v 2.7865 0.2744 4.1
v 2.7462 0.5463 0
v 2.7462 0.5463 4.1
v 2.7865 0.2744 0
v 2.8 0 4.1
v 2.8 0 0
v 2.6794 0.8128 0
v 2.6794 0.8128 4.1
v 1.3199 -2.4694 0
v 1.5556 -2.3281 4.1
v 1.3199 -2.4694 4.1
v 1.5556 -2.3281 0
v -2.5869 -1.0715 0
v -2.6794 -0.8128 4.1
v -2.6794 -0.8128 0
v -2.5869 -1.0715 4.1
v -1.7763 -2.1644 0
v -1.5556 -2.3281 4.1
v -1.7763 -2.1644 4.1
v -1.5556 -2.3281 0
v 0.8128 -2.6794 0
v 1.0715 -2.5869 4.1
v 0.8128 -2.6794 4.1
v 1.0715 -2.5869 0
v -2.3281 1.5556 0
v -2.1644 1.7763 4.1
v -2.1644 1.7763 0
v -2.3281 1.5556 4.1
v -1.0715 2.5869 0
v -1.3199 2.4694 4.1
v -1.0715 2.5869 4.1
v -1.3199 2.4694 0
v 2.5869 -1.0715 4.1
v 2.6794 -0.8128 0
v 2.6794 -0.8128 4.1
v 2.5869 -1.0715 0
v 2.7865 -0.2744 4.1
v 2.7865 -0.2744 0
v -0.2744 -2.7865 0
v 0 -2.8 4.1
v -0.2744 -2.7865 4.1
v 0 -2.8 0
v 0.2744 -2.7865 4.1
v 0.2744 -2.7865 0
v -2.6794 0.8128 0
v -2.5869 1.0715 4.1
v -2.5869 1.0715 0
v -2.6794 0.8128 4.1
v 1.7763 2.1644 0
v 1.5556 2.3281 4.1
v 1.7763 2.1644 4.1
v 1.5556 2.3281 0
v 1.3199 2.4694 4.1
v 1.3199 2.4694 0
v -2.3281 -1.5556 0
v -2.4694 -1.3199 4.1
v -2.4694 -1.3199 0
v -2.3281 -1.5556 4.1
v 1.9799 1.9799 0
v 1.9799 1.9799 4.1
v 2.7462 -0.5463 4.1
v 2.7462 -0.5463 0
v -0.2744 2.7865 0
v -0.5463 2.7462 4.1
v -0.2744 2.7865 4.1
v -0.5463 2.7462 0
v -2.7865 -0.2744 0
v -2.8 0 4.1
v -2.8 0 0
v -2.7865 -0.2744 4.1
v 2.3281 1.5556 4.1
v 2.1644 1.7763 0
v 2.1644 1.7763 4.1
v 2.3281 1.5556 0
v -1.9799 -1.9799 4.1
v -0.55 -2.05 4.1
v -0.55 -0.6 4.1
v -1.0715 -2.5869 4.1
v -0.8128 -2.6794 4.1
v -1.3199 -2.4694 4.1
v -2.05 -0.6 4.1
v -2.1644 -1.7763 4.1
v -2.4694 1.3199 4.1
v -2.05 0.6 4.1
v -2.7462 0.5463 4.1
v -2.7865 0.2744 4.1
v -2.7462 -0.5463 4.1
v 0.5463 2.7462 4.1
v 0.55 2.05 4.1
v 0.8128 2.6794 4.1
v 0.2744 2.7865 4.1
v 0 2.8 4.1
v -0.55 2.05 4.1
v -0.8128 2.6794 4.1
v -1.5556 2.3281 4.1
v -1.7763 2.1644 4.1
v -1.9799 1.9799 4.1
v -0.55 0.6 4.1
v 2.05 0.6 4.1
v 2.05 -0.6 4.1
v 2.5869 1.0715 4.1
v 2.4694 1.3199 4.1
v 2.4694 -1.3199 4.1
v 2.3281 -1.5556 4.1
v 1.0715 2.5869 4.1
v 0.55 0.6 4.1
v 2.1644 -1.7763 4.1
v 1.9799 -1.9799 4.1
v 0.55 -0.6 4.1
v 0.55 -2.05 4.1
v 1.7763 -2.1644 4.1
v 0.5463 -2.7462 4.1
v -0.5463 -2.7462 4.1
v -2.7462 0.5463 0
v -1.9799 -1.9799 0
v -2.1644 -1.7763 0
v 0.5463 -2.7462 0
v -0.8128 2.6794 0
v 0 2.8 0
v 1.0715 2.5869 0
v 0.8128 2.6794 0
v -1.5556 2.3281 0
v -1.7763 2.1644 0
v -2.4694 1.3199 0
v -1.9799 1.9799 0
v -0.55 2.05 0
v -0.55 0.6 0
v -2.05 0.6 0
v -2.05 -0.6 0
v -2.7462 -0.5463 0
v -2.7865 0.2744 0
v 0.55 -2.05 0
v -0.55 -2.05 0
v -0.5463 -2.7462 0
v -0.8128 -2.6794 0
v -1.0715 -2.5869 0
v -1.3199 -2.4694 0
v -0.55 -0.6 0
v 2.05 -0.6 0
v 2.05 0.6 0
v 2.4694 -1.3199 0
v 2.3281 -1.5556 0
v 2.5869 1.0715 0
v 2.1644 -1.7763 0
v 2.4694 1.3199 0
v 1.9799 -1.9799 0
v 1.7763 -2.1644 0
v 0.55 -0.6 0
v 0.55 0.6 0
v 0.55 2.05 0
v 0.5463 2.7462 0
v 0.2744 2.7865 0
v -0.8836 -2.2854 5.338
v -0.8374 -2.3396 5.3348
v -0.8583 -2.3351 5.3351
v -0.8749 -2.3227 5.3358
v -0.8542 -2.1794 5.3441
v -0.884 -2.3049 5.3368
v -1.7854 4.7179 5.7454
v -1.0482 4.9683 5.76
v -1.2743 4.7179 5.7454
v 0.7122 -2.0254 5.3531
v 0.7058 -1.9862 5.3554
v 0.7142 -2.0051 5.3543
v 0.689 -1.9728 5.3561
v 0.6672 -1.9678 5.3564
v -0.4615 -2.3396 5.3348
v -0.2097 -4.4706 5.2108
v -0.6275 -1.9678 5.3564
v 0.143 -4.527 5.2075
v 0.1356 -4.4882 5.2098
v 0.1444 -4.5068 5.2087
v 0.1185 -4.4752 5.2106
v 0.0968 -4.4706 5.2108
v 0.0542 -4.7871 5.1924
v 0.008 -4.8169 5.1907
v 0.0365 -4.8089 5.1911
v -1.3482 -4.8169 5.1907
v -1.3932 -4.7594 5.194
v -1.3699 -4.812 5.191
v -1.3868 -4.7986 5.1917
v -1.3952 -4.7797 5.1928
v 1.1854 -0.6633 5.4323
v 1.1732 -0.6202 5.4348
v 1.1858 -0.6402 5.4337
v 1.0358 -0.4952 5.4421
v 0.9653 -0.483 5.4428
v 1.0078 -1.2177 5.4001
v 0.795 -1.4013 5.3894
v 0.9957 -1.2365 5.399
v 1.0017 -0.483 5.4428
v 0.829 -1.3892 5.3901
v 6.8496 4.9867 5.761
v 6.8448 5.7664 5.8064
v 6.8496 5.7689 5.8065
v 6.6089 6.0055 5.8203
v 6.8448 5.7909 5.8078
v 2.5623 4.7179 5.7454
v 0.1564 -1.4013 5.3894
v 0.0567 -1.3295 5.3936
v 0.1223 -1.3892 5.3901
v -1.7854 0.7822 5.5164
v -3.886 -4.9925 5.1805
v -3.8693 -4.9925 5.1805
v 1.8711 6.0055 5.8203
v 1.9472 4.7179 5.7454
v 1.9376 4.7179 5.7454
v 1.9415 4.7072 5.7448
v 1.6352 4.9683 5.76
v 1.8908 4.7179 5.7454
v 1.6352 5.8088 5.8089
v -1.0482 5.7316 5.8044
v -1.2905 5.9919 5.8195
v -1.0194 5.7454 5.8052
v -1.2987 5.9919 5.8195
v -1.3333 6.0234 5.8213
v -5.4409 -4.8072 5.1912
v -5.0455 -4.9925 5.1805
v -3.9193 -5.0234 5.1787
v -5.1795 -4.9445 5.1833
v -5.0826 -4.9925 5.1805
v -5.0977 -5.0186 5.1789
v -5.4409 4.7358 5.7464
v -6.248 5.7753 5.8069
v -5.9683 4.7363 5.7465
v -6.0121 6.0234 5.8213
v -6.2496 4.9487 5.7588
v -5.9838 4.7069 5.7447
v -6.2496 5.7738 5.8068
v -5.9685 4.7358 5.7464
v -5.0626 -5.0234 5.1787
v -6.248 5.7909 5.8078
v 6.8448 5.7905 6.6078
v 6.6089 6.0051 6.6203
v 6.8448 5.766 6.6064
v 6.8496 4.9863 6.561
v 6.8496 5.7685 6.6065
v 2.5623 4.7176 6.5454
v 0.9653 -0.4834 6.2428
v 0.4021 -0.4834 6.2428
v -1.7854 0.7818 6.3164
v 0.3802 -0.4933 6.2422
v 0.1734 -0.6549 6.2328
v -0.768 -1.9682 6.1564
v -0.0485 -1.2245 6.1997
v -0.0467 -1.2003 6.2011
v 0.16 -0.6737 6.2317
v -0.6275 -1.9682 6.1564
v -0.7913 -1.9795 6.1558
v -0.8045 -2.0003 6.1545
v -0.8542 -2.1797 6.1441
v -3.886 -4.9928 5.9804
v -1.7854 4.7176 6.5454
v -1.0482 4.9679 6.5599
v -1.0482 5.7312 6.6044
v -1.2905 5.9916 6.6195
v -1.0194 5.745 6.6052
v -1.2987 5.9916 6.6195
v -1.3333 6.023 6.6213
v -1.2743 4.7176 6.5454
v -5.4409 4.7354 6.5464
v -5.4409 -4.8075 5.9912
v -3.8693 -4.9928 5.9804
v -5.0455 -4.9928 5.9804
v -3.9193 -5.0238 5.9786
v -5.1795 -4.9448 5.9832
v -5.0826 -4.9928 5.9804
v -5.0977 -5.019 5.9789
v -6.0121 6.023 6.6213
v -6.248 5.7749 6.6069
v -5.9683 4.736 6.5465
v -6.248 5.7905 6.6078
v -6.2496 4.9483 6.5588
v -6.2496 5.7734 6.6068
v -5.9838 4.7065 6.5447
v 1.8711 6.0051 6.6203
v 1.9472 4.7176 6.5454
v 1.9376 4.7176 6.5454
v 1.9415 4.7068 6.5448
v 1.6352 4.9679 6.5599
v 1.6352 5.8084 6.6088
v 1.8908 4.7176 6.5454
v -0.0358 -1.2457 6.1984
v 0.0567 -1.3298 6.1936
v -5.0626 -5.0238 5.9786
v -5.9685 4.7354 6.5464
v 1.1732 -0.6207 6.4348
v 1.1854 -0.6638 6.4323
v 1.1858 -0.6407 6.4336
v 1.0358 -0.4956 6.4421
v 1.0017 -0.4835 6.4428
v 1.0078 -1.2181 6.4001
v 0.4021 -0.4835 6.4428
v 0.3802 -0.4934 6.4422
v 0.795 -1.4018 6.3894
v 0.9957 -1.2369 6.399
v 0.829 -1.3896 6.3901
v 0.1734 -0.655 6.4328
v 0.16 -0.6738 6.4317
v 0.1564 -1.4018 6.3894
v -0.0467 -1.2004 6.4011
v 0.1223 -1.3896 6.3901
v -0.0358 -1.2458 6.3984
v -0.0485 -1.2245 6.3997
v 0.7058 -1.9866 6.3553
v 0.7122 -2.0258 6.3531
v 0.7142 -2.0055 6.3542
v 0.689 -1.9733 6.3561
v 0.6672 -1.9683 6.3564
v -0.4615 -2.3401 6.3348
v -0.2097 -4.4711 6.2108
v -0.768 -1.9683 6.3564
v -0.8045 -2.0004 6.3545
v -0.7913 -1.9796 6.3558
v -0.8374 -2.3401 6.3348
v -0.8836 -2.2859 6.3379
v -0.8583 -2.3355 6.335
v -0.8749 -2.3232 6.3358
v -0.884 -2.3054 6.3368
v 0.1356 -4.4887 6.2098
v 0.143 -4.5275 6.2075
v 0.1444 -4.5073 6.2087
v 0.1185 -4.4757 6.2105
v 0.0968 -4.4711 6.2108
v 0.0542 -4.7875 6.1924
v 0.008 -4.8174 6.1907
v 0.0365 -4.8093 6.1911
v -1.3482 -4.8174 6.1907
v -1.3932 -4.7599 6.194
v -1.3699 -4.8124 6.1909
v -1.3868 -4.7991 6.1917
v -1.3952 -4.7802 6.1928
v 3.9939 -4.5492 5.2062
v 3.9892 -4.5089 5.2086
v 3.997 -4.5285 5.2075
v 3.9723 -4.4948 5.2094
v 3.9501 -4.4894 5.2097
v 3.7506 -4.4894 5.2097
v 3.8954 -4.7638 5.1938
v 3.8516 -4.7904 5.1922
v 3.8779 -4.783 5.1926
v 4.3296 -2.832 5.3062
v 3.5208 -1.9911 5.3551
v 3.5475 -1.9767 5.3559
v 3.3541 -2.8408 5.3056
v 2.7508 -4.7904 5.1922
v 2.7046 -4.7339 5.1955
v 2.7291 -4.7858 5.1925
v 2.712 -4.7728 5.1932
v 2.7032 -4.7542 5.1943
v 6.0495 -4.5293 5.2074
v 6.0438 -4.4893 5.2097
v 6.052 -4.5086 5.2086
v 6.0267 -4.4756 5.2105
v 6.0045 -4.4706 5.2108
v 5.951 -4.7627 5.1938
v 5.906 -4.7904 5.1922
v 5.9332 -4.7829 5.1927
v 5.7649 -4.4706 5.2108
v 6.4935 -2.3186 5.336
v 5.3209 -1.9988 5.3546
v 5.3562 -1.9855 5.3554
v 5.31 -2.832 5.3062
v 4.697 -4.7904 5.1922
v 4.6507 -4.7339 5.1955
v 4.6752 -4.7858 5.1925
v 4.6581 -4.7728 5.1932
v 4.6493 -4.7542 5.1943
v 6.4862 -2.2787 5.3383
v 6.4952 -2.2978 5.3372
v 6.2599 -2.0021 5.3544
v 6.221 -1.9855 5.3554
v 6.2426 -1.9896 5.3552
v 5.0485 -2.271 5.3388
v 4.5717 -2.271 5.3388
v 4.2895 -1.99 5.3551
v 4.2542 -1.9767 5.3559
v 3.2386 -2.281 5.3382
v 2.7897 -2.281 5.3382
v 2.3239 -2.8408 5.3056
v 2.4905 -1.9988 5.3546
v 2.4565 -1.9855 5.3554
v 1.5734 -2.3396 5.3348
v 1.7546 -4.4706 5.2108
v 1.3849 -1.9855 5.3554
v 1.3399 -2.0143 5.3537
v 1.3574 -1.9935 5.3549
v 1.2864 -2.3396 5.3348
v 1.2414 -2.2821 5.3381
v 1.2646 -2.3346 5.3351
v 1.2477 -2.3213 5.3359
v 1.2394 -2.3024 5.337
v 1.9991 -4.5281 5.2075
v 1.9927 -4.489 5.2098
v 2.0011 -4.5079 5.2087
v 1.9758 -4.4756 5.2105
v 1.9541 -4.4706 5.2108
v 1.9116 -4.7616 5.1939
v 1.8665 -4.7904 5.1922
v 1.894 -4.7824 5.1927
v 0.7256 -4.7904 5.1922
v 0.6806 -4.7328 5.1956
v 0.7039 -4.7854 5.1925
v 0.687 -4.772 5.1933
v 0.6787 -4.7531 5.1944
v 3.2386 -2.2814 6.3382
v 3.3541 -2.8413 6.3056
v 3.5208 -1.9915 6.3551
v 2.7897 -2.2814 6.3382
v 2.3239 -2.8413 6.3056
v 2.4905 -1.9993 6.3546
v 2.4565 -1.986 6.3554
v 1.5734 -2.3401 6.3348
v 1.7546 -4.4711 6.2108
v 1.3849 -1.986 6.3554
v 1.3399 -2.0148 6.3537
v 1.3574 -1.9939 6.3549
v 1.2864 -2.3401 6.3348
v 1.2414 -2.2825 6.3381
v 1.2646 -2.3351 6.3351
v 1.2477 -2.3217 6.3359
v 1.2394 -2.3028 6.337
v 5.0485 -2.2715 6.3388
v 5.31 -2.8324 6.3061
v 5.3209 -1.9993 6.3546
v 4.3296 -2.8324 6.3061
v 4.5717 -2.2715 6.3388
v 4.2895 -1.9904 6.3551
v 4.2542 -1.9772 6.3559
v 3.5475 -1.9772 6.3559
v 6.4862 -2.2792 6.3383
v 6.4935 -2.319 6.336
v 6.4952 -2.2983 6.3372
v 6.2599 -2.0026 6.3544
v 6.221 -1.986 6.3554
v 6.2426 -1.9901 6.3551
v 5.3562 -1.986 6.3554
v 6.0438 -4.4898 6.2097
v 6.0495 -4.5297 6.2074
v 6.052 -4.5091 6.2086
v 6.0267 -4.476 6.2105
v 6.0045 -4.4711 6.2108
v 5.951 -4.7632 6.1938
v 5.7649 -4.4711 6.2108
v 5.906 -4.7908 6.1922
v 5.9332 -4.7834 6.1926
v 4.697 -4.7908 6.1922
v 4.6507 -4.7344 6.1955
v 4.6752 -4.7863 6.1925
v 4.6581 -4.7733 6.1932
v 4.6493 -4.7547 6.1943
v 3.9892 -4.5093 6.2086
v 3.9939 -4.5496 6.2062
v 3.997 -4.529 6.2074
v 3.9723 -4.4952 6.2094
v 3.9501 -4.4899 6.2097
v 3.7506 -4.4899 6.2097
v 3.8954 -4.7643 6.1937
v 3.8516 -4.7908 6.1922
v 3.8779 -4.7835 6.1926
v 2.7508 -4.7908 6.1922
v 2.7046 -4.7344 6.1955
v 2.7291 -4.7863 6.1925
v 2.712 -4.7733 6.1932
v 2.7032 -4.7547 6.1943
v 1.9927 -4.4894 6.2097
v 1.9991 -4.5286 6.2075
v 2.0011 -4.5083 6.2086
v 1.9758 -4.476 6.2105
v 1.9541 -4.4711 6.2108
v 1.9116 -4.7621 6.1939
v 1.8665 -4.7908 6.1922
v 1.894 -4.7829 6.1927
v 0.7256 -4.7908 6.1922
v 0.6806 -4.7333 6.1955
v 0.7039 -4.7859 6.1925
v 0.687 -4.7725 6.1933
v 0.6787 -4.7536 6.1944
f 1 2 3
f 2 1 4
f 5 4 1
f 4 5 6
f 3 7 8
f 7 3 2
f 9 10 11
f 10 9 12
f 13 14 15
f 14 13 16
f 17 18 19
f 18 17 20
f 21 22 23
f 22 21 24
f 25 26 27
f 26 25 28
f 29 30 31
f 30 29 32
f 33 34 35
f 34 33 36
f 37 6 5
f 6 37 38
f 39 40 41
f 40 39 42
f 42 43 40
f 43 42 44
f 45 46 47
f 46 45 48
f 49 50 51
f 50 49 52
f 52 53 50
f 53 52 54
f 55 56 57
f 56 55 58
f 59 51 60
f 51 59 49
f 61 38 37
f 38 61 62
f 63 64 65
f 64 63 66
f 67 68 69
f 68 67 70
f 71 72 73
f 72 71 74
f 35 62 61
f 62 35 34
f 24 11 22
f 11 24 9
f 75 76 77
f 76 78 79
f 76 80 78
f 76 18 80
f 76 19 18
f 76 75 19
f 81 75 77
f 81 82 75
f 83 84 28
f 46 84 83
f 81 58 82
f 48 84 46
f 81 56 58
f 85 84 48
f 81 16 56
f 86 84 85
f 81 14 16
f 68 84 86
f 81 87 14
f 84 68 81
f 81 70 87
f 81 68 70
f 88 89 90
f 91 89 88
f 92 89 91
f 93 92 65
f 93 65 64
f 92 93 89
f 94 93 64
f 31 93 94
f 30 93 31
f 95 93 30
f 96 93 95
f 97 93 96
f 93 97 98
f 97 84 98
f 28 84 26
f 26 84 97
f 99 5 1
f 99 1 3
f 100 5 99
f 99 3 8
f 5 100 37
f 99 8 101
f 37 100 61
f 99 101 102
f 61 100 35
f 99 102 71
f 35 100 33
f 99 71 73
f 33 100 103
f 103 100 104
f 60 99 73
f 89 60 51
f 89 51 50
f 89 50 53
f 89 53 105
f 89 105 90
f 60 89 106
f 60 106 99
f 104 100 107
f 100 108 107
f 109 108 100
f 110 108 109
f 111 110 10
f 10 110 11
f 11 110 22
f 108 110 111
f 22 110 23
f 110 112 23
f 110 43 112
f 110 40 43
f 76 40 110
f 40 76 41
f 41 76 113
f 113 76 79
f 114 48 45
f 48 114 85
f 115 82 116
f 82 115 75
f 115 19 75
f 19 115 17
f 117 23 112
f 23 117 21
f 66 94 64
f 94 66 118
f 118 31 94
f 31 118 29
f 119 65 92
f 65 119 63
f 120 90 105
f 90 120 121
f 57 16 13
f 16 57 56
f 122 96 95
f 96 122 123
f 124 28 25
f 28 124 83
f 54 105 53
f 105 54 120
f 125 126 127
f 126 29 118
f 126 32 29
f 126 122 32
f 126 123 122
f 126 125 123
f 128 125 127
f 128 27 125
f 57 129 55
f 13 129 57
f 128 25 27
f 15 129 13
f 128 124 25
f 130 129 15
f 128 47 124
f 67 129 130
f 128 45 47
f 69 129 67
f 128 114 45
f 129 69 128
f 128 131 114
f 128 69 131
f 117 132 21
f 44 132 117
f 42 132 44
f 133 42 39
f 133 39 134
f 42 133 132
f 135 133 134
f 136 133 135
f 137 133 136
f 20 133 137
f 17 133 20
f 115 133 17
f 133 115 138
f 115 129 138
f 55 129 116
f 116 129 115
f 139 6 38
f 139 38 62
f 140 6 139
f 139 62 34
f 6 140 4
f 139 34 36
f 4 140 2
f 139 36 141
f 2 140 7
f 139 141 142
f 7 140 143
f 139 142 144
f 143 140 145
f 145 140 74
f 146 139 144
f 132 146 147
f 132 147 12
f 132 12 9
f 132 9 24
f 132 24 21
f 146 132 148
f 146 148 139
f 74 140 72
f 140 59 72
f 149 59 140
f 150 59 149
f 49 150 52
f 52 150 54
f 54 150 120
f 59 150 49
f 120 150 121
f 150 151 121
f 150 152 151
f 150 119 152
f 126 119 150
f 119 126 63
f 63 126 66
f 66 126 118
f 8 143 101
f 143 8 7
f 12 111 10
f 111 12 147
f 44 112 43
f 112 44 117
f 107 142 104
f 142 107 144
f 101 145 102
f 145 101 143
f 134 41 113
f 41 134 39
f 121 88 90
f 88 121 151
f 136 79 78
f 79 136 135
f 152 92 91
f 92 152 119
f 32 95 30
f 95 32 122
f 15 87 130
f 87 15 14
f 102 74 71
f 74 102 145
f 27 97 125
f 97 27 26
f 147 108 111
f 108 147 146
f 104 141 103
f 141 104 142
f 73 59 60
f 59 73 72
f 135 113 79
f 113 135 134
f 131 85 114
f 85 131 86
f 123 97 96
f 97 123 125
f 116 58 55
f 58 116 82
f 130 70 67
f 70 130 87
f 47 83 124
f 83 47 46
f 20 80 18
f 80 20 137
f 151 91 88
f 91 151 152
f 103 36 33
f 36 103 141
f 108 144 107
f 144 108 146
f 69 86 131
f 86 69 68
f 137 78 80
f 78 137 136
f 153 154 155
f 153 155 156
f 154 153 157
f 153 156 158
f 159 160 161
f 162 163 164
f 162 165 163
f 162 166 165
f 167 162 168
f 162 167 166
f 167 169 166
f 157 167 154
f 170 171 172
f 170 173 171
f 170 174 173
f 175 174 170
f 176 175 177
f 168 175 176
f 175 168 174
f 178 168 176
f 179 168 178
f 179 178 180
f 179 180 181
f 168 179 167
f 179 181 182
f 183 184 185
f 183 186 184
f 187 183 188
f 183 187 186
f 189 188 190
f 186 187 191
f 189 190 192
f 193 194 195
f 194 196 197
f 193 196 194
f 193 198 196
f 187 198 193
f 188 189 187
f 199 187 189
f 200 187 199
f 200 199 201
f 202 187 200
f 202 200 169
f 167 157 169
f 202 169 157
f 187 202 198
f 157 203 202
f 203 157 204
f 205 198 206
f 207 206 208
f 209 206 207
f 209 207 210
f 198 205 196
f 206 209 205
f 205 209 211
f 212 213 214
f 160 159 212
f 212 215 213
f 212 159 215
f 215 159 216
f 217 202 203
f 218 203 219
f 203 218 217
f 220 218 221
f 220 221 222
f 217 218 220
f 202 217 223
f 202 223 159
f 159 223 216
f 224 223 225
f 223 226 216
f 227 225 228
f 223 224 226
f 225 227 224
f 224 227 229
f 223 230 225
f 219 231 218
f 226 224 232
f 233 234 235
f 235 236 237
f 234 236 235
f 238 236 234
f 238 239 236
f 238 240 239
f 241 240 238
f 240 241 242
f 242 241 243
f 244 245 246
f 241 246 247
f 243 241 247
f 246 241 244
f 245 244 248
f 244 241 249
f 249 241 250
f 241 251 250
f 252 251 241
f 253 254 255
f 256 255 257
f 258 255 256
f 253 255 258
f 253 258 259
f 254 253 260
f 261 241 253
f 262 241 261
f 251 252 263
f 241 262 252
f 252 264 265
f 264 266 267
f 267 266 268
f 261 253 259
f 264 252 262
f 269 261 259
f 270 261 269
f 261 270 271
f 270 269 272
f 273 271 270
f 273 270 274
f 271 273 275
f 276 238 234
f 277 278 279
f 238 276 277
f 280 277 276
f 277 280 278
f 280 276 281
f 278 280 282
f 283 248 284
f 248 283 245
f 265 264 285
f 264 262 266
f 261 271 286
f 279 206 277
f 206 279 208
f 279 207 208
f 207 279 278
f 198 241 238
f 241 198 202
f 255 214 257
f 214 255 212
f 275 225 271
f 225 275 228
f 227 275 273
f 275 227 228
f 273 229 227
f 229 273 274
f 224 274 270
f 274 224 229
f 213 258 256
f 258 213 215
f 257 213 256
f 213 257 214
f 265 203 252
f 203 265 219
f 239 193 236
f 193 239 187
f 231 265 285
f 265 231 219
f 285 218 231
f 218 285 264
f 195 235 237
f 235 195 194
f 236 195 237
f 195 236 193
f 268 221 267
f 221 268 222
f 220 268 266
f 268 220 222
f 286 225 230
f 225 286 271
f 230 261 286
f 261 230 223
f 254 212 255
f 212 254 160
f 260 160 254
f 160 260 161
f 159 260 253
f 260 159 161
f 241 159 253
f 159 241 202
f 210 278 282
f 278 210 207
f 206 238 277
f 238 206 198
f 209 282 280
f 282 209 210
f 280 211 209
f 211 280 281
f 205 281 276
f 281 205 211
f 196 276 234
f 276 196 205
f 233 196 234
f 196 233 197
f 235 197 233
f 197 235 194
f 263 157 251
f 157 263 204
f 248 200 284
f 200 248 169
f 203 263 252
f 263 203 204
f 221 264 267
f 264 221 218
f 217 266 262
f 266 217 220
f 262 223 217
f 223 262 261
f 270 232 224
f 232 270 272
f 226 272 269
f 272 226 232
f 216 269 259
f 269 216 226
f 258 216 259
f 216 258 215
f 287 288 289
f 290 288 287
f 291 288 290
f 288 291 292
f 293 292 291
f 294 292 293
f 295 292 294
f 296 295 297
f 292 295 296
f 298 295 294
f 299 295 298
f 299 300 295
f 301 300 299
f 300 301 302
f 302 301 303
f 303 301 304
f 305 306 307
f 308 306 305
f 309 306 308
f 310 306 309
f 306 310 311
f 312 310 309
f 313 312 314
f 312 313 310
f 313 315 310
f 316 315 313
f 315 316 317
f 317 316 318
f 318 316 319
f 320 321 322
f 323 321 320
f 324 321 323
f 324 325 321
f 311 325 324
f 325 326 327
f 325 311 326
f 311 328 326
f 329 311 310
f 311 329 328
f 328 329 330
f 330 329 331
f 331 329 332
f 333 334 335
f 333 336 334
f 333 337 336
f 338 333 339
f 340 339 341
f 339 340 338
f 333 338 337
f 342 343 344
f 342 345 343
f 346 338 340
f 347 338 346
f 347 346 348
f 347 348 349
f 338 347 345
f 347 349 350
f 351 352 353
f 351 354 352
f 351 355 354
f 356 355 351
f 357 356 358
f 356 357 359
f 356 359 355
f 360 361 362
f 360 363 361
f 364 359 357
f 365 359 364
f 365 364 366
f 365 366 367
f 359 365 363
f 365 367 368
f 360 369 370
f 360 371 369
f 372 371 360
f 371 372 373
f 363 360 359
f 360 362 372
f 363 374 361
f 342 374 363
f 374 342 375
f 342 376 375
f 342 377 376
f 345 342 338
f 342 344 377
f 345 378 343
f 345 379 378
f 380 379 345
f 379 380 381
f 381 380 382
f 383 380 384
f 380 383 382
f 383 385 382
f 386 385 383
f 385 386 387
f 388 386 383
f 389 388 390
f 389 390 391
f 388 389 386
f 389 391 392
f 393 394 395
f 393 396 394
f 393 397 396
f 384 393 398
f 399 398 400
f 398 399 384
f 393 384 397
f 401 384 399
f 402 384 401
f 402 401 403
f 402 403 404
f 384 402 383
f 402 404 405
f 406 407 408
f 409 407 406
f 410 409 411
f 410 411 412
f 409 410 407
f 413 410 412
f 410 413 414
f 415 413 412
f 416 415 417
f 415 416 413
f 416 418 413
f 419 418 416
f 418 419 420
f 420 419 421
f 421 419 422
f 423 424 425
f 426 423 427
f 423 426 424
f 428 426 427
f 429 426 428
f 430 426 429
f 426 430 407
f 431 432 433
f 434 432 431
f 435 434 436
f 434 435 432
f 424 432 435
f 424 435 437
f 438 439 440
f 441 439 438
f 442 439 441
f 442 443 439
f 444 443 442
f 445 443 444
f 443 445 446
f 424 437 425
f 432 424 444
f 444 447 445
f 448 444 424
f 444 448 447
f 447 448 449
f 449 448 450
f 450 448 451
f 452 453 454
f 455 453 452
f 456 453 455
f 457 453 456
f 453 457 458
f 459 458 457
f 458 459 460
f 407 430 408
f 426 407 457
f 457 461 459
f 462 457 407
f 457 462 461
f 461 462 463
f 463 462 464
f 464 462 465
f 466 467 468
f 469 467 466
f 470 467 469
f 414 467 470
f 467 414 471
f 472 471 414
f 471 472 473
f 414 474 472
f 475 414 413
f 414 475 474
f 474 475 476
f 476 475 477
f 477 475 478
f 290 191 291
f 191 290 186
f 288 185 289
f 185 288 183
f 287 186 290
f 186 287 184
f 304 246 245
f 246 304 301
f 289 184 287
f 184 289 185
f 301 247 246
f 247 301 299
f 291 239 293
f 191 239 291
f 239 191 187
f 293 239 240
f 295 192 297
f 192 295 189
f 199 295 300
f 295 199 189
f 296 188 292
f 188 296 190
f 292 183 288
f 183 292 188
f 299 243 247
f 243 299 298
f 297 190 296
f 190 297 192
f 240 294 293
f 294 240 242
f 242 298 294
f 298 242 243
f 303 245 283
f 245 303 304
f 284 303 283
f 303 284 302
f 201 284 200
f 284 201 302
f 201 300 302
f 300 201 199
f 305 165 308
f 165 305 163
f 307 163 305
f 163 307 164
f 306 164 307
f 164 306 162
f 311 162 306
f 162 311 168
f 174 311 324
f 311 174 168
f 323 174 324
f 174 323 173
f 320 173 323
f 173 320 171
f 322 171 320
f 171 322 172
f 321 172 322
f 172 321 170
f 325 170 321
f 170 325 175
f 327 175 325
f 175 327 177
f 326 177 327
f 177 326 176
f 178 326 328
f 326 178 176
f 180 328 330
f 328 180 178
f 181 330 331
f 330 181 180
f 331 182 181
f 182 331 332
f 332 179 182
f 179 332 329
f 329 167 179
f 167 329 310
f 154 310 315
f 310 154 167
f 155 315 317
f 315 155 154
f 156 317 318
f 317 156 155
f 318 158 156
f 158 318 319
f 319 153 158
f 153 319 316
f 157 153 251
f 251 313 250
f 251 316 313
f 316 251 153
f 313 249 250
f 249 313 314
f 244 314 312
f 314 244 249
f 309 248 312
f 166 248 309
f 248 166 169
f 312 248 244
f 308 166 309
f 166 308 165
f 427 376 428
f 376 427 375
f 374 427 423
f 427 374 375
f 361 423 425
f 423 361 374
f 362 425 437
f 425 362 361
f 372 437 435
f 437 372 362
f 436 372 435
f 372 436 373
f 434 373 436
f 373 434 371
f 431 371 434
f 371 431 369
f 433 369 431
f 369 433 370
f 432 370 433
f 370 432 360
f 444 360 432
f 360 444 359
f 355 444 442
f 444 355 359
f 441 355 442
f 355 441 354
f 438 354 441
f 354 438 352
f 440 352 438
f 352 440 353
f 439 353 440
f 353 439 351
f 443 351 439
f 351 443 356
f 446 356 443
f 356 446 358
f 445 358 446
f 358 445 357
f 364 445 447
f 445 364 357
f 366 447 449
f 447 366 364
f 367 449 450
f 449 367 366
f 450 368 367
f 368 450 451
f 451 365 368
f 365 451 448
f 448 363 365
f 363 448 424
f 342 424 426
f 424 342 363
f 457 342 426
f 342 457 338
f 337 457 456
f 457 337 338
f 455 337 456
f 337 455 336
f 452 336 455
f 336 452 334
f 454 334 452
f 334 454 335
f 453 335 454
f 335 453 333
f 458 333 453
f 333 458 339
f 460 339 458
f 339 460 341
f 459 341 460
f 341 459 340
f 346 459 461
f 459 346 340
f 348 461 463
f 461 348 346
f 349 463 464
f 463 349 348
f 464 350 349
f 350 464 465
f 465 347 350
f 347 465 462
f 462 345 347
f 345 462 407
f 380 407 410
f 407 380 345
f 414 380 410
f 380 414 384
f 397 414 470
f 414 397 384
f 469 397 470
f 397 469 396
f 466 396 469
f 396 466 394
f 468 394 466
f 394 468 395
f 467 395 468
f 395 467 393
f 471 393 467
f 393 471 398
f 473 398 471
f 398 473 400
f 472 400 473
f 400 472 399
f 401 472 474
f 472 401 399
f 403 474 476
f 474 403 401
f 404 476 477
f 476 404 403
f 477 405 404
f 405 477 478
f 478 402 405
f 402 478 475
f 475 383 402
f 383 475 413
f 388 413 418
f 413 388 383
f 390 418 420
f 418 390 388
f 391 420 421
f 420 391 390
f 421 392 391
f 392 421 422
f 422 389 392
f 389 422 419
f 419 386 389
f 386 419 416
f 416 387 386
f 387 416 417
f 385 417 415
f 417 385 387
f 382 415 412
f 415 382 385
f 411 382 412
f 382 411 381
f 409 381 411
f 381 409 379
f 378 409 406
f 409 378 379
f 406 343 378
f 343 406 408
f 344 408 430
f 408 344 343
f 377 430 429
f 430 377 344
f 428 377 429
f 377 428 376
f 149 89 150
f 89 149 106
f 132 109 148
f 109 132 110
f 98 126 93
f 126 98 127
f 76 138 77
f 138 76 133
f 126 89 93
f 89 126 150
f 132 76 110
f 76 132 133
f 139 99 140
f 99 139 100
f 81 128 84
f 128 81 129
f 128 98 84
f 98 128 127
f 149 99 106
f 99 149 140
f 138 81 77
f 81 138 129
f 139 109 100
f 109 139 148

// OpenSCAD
fudge = 0.1;


module letter_im(h)
{
  scale([25.4/90, -25.4/90, 1]) union()
  {
    linear_extrude(height=h)
      polygon([[-84.180606,-83.616245],[-92.321417,-77.256270],[-100.462229,-56.521010],[-94.236902,-50.858018],[-69.096162,-50.858018],[-62.535626,-56.869502],[-55.544105,-78.693799],[-60.955350,-83.616245],[-84.180606,-83.616245]]);
    linear_extrude(height=h)
      polygon([[-130.248020,-25.156750],[-133.360683,-13.917890],[-115.929770,-13.917890],[-153.473276,83.616245],[-100.079132,83.616245],[-96.583371,73.379299],[-111.284719,73.379299],[-74.124310,-25.156750],[-130.248020,-25.156750]]);
    linear_extrude(height=h)
      polygon([[39.655499,-24.808258],[28.018928,-12.828853],[8.672529,-12.828853],[-3.682349,-24.459766],[-45.870906,-24.459766],[-49.749763,-13.917890],[-35.814610,-13.917890],[-71.825728,82.570770],[-26.907605,82.570770],[-23.459732,73.379299],[-33.899125,73.379299],[-10.290772,5.815456],[34.244254,5.815456],[7.906335,82.570770],[51.244183,82.570770],[55.123041,74.119844],[44.683647,74.119844],[68.675097,5.466965],[111.246751,5.466965],[84.525735,82.570770],[132.125538,82.570770],[136.004395,73.379299],[123.984726,73.379299],[153.435308,-13.569398],[144.528303,-24.459766],[110.480557,-24.459766],[99.227083,-13.220907],[78.731393,-13.220907],[67.094822,-24.808258],[39.655499,-24.808258]]);
  }
  scale([25.4/90, -25.4/90, 1]) union()
  {
    linear_extrude(height=h)
      polygon([[-84.563703,-85.315143],[-85.425671,-84.923089],[-93.566483,-78.563115],[-94.093241,-77.822570],[-102.234052,-57.087309],[-102.301316,-56.137837],[-101.803068,-55.301289],[-95.577742,-49.638297],[-94.236902,-49.159121],[-69.096162,-49.159121],[-67.755322,-49.638297],[-61.194786,-55.649780],[-60.715915,-56.390325],[-53.724395,-78.214623],[-53.707693,-79.123815],[-54.203266,-79.913520],[-59.614511,-84.835966],[-60.955350,-85.315143],[-84.180606,-85.315143],[-84.563703,-85.315143]]);
    linear_extrude(height=h)
      polygon([[-130.631117,-26.855647],[-131.548013,-26.410886],[-132.067731,-25.592365],[-135.180394,-14.353505],[-135.195922,-13.583380],[-134.840142,-12.884418],[-134.184505,-12.396992],[-133.360683,-12.218993],[-118.563562,-12.218993],[-155.245100,83.049946],[-155.322664,83.848928],[-154.993215,84.592928],[-154.328499,85.119922],[-153.473276,85.315143],[-100.079132,85.315143],[-98.957924,84.997652],[-98.259421,84.138983],[-94.763661,73.902037],[-94.708760,73.105454],[-95.055306,72.372201],[-95.728571,71.860395],[-96.583371,71.680402],[-108.650927,71.680402],[-72.352486,-24.590451],[-72.274922,-25.389433],[-72.604371,-26.133433],[-73.269086,-26.660426],[-74.124310,-26.855647],[-130.248020,-26.855647],[-130.631117,-26.855647]]);
    linear_extrude(height=h)
      polygon([[39.272402,-26.507156],[38.218885,-25.940857],[27.109072,-14.527751],[9.438723,-14.527751],[-2.341509,-25.635926],[-3.682349,-26.158664],[-45.870906,-26.158664],[-46.952886,-25.846181],[-47.642730,-25.026066],[-51.521587,-14.484189],[-51.599151,-13.685208],[-51.269702,-12.941208],[-50.604987,-12.414214],[-49.749763,-12.218993],[-38.448402,-12.218993],[-73.597551,82.004471],[-73.675115,82.803452],[-73.345667,83.547453],[-72.680951,84.074446],[-71.825728,84.269667],[-26.907605,84.269667],[-25.825625,83.957184],[-25.135781,83.137069],[-21.687908,73.945599],[-21.610344,73.146617],[-21.939793,72.402617],[-22.604508,71.875623],[-23.459732,71.680402],[-31.313220,71.680402],[-8.902046,7.514354],[31.658349,7.514354],[6.086625,82.048032],[6.031724,82.844615],[6.378270,83.577868],[7.051534,84.089674],[7.906335,84.269667],[51.244183,84.269667],[52.277731,83.981050],[52.968120,83.224192],[56.846977,74.773266],[56.969688,73.959040],[56.662796,73.186065],[55.996464,72.631071],[55.123041,72.420947],[47.269552,72.420947],[70.063824,7.165862],[108.660846,7.165862],[82.706025,82.048032],[82.651124,82.844615],[82.997670,83.577868],[83.670934,84.089674],[84.525735,84.269667],[132.125538,84.269667],[133.197102,83.975096],[133.897361,83.180631],[137.776218,73.989160],[137.875189,73.177152],[137.550839,72.415308],[136.876451,71.875756],[136.004395,71.680402],[126.570631,71.680402],[155.255019,-13.046661],[155.322664,-13.862804],[154.967696,-14.614874],[146.060691,-25.505242],[145.379417,-25.996751],[144.528303,-26.158664],[110.480557,-26.158664],[109.091830,-25.635926],[98.365114,-14.919804],[79.593361,-14.919804],[68.483548,-25.984418],[67.094822,-26.507156],[39.655499,-26.507156],[39.272402,-26.507156],[39.272402,-26.507156]]);
  }
}
module letter_V(h)
{
scale([25.4/90, -25.4/90, 1]) union()
  {
    linear_extrude(height=h)
      polygon([[69.017637,-209.009190],[62.457101,-203.041268],[62.457101,-181.129848],[68.203556,-175.902471],[98.563993,-175.902471],[98.563993,-154.731596],[-102.274609,30.448221],[-102.274609,-175.641102],[-68.897283,-175.641102],[-62.049424,-181.870393],[-62.049424,-204.043182],[-68.370525,-208.486452],[-244.020499,-208.486452],[-249.766954,-203.259075],[-249.766954,-180.607110],[-243.924725,-175.292610],[-213.372739,-175.292610],[-213.372739,204.214933],[-207.626284,209.442309],[-172.908119,209.442309],[247.971823,-185.616679],[247.971823,-203.041268],[241.411287,-209.009190],[69.017637,-209.009190]]);
  }
  scale([25.4/90, -25.4/90, 1]) union()
  {
    linear_extrude(height=h)
      polygon([[-62.343597,-201.534487],[-51.945256,-206.512943],[-62.617235,-216.220934],[-248.419280,-216.220934],[-257.859894,-207.633093],[-257.859894,-175.148683],[-247.393132,-165.627400],[-242.399187,-175.148683],[-248.966557,-181.122836],[-248.966557,-204.023722],[-244.041033,-208.006481],[-66.721844,-208.006481],[-62.343597,-201.534487]]);
  }
  scale([25.4/90, -25.4/90, 1]) union()
  {
    linear_extrude(height=h)
      polygon([[248.512266,-202.530170],[257.859894,-207.439541],[257.859894,-176.642221],[-166.113786,217.459209],[-211.126412,217.459209],[-206.825887,209.685807],[-172.347157,209.685807],[247.964989,-185.105581]]);
  }
  scale([25.4/90, -25.4/90, 1]) union()
  {
    linear_extrude(height=h)
      polygon([[69.017637,-209.009190],[62.457101,-203.041268],[62.457101,-181.129848],[68.203556,-175.902471],[98.563993,-175.902471],[98.563993,-154.731596],[-102.274609,30.448221],[-102.274609,-175.641102],[-68.897283,-175.641102],[-62.049424,-181.870393],[-62.049424,-204.043182],[-68.370525,-208.486452],[-244.020499,-208.486452],[-249.766954,-203.259075],[-249.766954,-180.607110],[-243.924725,-175.292610],[-213.372739,-175.292610],[-213.372739,204.214933],[-207.626284,209.442309],[-172.908119,209.442309],[247.971823,-185.616679],[247.971823,-203.041268],[241.411287,-209.009190],[69.017637,-209.009190]]);
  }
  scale([25.4/90, -25.4/90, 1]) union()
  {
    linear_extrude(height=h)
      polygon([[98.813328,-175.391652],[89.332167,-166.414894],[64.565038,-166.414894],[70.369831,-175.391652],[98.813328,-175.391652]]);
  }
  scale([25.4/90, -25.4/90, 1]) union()
  {
    linear_extrude(height=h)
      polygon([[-213.678190,-175.919687],[-213.678190,204.272545],[-208.260386,209.905023],[-212.509055,217.270870],[-224.513813,206.384726],[-224.513813,-166.062862]]);
  }
scale([25.4/90, -25.4/90, 1]) union()
  {
    linear_extrude(height=h)
      polygon([[-243.695832,-175.919687],[-246.791731,-166.766912],[-224.346507,-166.766912],[-211.962942,-175.919687],[-243.695832,-175.919687]]);
  }
scale([25.4/90, -25.4/90, 1]) union()
  {
    linear_extrude(height=h)
      polygon([[64.625706,-165.639834],[69.551230,-174.849970],[62.436567,-180.824123],[62.436567,-201.235774],[70.645799,-208.703465],[241.944880,-208.703465],[248.512266,-200.737933],[257.816052,-206.712085],[248.238627,-215.424380],[64.078413,-215.424380],[54.911454,-207.085459],[54.911454,-174.352129],[64.420473,-166.199902]]);
    linear_extrude(height=h)
      polygon([[-84.405862,-9.023895],[-102.295128,30.461464],[99.651713,-153.741321],[99.651713,-175.646525],[-84.405862,-9.023895]]);
  }
scale([25.4/90, -25.4/90, 1]) union()
  {
    linear_extrude(height=h)
      polygon([[-62.753511,-202.673958],[-53.852819,-207.954403],[-53.852819,-175.919687],[-64.107958,-166.590896],[-84.037752,-166.590896],[-84.037752,-8.705513],[-102.226124,30.369811],[-102.226124,-175.919687],[-68.945293,-175.919687],[-62.753511,-180.496081],[-62.753511,-202.673958]]);
  }
scale([25.4/90, -25.4/90, 1]) union()
  {
    linear_extrude(height=h)
      polygon([[-248.506979,-217.459209],[-64.301437,-217.459209],[-53.078840,-207.250352],[-53.078840,-175.919687],[-61.979517,-166.062862],[-82.102821,-166.062862],[-82.102821,-10.465661],[91.267098,-166.062862],[62.630107,-166.062862],[52.568448,-175.919687],[52.568448,-209.010500],[61.856129,-216.755158],[248.383576,-216.755158],[257.671257,-208.306435],[257.671257,-177.327816],[-164.143932,216.241565],[-212.130248,216.241565],[-226.020089,208.946656],[-226.020089,-167.470977],[-249.280942,-167.470977],[-257.794645,-175.215636],[-257.794645,-208.306435],[-248.506979,-217.459209]]);
  }
}

module vim_logo(hV,him)
{
letter_V(hV);
translate([25,-35,0],center=true) letter_im(him);

}


// Row 4 decorated Cherry MX key

// dimensions Cherry MX connector
c_corr = .1;                // tolerance
c_horiz = 1.1;              // horizontal bar width
c_vert = 1.0;               // vertical bar width
c_dia = 4;                  // cross width
c_depth = 4.5;                // connector depth
c_space = 4;                // height of hollow inside
c_inset = .75;              // distance connector start to keycap base

//cut out size
cut_h=9;
cut_x=1.4;
cut_y=1;

// keycap shape
head_tilt = 3;              // rotation of top around x-axis
head_pos = 2.25;            // keycap top y-offset
head_height = 11;           // z-offset of keycap top from the bottom of the keycap
cutoff = 6.5;               // cut keycap here to make room for decoration
                            // must be bigger than c_space + c_corr
key_scale = [1.0,1.00,1.00]; // overall scale

// stuff
$fn = 64;

// create basic key shape from dxf frames for base and top
module shape()
{
    hull()
    {
        translate([0,0,-c_inset]) linear_extrude(height=.01) import("base.dxf");
        rotate([head_tilt,0,0]) translate([0,6.75+head_pos,head_height-c_inset]) linear_extrude(height=.01) import("top.dxf");
    }
}

// construct the connector pin
module connector() 
{
    translate([0,0,c_depth/2-.1]) union()
    {
        cube([c_vert+c_corr,c_dia+c_corr,c_depth+.1], center=true );
        cube([c_dia+c_corr,c_horiz+c_corr,c_depth+.1], center=true );
    }
}



// create the hollow key with decoration
module key()
{
    difference()
    {
        // combine basic key shape with decoration
        union()
        {

            difference()
            {
                shape();
                rotate([head_tilt,0,0]) translate([0,0,5+cutoff-c_inset]) cube([100,100,10], center=true);
            }
        }

        // subtract scaled basic shape, cut at minimum required height
        difference()
        {
            scale([.9,.9,.9]) translate([0,0,-1]) shape();
            translate([0,0,5+c_space+c_corr]) cube([100,100,10], center=true);
        }
    }
}

// combine key, pin and connector. cleanup below the key
scale(key_scale) difference()
{
union()
{
	difference()
	{
    	union() 
    		{ 
        		key();
		      cylinder( h=c_space+c_corr, r=(c_dia+c_corr+1.5)/2 );
    		}
		
		translate([0.3,0.5,6.5])
			scale([0.09,0.09,1])
				translate([-10,0,0],center=true)
 				{ 
						rotate([0.3,0,0])
							rotate(45)
								cube(size = [100,100,2], center = true);
				}    
	}
	translate([0.3,0.5,5.5])
		scale([0.09,0.09,1])
			rotate([0.3,0,0])		
				vim_logo(0.8,1);  
}
	connector();
	translate([0,0,-50-c_inset]) cube([100,100,100], center=true);
}
